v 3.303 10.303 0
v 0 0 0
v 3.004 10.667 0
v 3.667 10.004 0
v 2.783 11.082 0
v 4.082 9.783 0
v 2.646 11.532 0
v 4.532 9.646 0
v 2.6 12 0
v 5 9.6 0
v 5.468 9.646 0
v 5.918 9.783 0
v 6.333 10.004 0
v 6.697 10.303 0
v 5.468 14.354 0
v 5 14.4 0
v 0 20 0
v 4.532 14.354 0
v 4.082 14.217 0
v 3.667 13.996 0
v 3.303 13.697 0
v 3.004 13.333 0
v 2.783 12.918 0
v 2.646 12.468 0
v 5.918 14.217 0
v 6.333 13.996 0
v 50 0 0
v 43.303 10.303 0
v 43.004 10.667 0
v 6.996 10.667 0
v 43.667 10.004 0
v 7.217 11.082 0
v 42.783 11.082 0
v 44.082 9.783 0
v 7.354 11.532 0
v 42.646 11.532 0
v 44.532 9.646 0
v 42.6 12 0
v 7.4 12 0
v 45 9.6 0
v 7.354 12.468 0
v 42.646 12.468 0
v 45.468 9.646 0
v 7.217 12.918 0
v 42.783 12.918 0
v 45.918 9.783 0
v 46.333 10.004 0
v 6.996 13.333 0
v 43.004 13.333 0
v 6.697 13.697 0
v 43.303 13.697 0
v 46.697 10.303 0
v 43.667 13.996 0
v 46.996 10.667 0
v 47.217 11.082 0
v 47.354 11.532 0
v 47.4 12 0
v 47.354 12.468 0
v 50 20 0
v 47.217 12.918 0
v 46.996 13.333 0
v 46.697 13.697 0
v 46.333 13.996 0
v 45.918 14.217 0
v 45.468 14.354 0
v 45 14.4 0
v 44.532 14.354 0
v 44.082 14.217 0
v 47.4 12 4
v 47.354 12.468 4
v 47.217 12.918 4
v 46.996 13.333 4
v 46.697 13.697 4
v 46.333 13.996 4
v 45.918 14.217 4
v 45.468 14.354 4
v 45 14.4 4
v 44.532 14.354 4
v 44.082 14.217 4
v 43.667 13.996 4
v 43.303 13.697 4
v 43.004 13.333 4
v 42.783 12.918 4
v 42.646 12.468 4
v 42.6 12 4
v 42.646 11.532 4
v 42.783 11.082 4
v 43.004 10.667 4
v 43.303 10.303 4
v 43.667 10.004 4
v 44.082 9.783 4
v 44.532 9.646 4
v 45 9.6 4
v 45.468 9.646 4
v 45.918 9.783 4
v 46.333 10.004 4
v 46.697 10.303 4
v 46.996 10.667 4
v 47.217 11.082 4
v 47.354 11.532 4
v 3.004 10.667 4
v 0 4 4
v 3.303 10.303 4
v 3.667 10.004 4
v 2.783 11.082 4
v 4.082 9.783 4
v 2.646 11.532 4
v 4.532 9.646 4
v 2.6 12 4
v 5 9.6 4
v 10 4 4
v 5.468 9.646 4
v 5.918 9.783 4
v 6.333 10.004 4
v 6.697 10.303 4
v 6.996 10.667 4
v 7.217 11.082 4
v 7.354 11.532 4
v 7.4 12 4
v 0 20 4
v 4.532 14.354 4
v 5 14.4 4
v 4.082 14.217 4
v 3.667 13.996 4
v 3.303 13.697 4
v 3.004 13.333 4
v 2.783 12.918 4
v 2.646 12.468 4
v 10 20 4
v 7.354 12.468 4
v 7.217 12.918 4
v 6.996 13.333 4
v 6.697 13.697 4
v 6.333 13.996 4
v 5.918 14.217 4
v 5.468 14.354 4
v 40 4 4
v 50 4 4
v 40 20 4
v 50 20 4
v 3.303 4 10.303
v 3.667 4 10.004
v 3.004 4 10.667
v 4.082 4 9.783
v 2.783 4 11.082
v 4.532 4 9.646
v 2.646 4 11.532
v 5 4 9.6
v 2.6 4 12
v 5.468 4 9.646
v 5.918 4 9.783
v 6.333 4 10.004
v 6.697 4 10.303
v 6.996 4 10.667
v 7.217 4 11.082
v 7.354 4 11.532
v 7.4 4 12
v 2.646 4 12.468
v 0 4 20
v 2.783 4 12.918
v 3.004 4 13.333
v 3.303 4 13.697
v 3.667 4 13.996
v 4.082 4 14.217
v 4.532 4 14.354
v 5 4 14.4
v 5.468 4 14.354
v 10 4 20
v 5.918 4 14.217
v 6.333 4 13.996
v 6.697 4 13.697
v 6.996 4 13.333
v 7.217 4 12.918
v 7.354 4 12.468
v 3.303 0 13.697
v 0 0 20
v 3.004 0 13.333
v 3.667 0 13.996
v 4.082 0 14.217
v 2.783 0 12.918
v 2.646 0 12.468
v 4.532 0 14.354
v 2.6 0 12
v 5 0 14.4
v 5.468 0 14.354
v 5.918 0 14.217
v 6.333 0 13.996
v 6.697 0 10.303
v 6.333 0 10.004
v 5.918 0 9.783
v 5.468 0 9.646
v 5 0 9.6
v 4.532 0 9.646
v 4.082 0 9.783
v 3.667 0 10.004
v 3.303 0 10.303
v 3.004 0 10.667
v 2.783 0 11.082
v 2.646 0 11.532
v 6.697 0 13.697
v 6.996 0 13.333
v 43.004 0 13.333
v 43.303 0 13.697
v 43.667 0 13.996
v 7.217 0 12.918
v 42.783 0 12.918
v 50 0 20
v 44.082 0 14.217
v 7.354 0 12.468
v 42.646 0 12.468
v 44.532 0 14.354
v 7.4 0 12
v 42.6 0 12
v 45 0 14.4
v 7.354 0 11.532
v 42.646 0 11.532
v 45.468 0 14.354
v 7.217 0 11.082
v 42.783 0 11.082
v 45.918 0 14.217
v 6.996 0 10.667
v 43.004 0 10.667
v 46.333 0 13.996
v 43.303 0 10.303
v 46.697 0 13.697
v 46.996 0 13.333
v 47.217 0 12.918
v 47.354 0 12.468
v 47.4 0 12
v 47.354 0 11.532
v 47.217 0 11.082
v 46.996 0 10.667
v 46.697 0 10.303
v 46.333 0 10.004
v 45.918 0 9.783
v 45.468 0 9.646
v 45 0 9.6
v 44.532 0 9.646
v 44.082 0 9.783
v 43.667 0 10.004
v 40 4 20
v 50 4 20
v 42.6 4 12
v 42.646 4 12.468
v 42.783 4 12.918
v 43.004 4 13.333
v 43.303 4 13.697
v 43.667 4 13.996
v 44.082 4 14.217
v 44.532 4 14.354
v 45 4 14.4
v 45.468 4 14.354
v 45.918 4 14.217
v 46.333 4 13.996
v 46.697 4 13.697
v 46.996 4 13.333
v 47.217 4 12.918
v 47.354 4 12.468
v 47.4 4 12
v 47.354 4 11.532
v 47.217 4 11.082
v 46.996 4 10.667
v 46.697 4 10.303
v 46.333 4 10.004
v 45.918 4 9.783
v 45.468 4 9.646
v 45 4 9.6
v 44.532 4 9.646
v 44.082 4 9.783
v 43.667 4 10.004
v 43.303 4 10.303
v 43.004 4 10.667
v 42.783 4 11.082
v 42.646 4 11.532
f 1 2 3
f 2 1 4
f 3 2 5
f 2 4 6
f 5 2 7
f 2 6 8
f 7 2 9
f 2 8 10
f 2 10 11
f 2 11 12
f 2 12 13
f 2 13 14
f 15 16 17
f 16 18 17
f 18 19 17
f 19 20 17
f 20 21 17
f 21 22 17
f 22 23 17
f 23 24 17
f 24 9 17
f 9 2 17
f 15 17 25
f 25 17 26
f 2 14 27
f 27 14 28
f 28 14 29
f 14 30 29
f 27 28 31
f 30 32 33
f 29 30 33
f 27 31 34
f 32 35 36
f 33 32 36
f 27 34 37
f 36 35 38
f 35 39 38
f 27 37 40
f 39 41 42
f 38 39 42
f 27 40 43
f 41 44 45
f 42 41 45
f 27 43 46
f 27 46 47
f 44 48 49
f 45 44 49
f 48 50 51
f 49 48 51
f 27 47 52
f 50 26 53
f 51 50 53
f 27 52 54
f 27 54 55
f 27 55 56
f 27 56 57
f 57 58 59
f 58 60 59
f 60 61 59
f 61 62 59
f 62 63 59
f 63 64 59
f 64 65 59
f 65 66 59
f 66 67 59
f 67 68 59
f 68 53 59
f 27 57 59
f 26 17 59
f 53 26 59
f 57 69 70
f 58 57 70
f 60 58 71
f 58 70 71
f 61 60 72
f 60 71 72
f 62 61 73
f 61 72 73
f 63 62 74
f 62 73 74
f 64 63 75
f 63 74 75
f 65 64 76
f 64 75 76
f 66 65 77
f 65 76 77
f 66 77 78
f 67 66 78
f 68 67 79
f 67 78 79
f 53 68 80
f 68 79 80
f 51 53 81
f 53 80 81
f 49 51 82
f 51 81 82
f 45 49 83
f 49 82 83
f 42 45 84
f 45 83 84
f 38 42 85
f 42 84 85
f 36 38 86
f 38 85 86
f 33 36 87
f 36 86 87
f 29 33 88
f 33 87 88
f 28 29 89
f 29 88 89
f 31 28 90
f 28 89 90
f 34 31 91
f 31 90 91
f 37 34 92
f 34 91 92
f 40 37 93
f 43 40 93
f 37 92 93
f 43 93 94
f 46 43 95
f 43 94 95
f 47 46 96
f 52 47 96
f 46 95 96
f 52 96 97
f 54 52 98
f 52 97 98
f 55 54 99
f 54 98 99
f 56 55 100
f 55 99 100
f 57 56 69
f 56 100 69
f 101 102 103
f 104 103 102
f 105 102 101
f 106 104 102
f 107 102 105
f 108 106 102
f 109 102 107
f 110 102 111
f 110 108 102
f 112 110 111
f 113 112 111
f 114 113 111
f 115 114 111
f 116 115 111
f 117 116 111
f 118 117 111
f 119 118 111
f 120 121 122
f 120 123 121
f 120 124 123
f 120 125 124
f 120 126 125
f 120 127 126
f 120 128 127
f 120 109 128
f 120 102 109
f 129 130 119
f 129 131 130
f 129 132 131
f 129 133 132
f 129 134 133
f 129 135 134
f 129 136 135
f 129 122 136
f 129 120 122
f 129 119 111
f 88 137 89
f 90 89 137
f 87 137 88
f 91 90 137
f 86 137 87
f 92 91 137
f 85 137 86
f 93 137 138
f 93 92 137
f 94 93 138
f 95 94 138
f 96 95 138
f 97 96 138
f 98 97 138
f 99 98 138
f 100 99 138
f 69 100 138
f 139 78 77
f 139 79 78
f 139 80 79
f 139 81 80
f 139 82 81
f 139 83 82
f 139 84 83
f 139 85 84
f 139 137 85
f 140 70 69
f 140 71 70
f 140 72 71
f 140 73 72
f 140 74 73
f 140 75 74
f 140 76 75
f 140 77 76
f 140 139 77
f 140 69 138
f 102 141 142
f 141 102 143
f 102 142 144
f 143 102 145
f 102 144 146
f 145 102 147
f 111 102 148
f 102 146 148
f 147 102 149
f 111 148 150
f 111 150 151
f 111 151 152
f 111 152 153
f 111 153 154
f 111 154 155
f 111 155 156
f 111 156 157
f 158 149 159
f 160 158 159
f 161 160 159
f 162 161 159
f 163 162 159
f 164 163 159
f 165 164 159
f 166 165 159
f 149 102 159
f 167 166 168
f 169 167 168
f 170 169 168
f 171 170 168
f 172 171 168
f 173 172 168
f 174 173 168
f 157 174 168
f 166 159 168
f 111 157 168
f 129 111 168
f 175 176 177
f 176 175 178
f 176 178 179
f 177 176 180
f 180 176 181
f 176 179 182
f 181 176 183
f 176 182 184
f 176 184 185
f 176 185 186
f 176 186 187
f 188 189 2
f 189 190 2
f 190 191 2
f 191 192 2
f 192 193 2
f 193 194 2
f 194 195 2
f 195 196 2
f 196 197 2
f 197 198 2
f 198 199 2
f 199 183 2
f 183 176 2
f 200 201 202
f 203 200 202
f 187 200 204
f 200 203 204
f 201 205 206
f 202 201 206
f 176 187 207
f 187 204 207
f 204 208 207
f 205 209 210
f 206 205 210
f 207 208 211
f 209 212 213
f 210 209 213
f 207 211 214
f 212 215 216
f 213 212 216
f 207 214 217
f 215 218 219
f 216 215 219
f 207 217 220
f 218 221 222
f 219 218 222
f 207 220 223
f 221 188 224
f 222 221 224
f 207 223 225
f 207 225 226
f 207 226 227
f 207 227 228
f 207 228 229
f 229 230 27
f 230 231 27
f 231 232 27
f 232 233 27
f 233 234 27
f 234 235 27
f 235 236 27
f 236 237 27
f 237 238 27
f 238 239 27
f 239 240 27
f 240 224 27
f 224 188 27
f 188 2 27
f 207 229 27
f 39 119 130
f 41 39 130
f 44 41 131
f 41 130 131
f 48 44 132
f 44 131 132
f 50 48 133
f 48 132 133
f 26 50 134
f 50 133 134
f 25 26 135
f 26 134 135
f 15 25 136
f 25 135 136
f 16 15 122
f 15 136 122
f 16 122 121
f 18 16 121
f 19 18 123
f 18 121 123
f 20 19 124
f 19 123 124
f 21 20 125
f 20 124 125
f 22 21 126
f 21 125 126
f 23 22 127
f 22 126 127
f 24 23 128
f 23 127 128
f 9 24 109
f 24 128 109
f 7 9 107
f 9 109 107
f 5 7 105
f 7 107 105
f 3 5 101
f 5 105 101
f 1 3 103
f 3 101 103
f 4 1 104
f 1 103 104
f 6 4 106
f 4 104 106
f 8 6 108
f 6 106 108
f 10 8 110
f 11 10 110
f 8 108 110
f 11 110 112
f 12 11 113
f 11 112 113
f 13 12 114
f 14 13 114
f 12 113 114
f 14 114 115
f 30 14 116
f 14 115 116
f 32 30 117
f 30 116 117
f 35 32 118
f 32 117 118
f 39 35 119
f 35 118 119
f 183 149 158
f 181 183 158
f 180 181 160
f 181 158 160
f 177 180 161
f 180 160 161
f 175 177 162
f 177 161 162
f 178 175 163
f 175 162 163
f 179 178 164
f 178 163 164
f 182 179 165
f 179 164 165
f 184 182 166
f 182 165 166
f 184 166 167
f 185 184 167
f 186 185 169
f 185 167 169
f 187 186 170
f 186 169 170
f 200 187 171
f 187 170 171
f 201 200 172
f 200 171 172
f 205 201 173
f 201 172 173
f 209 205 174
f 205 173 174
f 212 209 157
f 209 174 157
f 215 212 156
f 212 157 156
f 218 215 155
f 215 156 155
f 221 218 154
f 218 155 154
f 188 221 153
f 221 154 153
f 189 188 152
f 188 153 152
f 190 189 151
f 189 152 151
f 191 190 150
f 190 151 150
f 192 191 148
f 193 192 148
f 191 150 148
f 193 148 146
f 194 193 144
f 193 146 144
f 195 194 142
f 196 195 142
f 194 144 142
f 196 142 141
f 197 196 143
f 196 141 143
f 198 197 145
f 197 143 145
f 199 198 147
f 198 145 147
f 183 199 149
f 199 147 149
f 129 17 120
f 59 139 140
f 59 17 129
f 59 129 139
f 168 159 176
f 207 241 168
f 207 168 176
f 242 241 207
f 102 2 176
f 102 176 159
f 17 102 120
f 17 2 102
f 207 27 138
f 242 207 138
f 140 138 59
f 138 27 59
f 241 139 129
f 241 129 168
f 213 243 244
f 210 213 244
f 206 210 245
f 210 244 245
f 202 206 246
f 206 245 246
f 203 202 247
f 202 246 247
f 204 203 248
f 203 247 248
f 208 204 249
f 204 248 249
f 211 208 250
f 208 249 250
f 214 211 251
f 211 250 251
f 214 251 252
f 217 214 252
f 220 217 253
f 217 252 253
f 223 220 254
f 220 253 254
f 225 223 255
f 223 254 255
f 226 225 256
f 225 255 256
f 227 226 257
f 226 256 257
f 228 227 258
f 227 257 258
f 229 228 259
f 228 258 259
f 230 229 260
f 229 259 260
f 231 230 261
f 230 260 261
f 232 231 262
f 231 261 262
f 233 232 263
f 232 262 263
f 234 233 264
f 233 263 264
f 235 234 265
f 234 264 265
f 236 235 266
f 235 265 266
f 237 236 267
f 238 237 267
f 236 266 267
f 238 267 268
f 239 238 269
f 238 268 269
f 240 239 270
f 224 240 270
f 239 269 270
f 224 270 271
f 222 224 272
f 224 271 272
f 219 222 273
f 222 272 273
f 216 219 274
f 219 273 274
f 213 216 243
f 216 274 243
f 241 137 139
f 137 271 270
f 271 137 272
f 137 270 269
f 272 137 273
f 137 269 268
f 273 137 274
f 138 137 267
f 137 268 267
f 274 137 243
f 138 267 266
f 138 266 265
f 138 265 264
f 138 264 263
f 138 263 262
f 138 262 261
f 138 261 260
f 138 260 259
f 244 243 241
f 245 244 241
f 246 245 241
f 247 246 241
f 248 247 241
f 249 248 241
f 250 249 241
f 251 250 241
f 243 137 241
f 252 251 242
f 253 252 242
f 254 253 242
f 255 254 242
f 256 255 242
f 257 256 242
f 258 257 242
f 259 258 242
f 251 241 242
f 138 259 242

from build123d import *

# Parameters (mm, degrees)
SKETCH_W        = 50
SKETCH_H        = 20
PAD_DEPTH       = 20
SKETCH001_W     = 10
SKETCH001_H     = 16
POCKET_DEPTH    = 16
POCKET001_DEPTH = 30
SKETCH003_R     = 2.4
POCKET002_DEPTH = 4
SKETCH004_R     = 2.4
POCKET003_DEPTH = 4


with BuildPart() as part:
    # Sketch → Pad (new body)
    with BuildSketch(Plane.XY):
        with Locations((25, 10)):
            Rectangle(SKETCH_W, SKETCH_H)
    extrude(amount=PAD_DEPTH)

    # Sketch001 → Pocket (cut)
    with BuildSketch(Plane.XY.offset(20)):
        with Locations((5, 12)):
            Rectangle(SKETCH001_W, SKETCH001_H)
        with Locations((45, 12)):
            Rectangle(SKETCH001_W, SKETCH001_H)
    extrude(amount=-POCKET_DEPTH, mode=Mode.SUBTRACT)

    # Sketch002 → Pocket001 (cut)
    with BuildSketch(Plane.YZ.offset(40)):
        Polygon((20, 4), (4, 20), (20, 20), align=None)
    extrude(amount=-POCKET001_DEPTH, mode=Mode.SUBTRACT)

    # Sketch003 → Pocket002 (cut)
    with BuildSketch(Plane(origin=(0, 4, 0), x_dir=(-1, 0, 0), z_dir=(0, 1, 0))):
        with Locations((-45, 12)):
            Circle(SKETCH003_R)
        with Locations((-5, 12)):
            Circle(SKETCH003_R)
    extrude(amount=-POCKET002_DEPTH, mode=Mode.SUBTRACT)

    # Sketch004 → Pocket003 (cut)
    with BuildSketch(Plane.XY.offset(4)):
        with Locations((5, 12)):
            Circle(SKETCH004_R)
        with Locations((45, 12)):
            Circle(SKETCH004_R)
    extrude(amount=-POCKET003_DEPTH, mode=Mode.SUBTRACT)


solid = part.part
